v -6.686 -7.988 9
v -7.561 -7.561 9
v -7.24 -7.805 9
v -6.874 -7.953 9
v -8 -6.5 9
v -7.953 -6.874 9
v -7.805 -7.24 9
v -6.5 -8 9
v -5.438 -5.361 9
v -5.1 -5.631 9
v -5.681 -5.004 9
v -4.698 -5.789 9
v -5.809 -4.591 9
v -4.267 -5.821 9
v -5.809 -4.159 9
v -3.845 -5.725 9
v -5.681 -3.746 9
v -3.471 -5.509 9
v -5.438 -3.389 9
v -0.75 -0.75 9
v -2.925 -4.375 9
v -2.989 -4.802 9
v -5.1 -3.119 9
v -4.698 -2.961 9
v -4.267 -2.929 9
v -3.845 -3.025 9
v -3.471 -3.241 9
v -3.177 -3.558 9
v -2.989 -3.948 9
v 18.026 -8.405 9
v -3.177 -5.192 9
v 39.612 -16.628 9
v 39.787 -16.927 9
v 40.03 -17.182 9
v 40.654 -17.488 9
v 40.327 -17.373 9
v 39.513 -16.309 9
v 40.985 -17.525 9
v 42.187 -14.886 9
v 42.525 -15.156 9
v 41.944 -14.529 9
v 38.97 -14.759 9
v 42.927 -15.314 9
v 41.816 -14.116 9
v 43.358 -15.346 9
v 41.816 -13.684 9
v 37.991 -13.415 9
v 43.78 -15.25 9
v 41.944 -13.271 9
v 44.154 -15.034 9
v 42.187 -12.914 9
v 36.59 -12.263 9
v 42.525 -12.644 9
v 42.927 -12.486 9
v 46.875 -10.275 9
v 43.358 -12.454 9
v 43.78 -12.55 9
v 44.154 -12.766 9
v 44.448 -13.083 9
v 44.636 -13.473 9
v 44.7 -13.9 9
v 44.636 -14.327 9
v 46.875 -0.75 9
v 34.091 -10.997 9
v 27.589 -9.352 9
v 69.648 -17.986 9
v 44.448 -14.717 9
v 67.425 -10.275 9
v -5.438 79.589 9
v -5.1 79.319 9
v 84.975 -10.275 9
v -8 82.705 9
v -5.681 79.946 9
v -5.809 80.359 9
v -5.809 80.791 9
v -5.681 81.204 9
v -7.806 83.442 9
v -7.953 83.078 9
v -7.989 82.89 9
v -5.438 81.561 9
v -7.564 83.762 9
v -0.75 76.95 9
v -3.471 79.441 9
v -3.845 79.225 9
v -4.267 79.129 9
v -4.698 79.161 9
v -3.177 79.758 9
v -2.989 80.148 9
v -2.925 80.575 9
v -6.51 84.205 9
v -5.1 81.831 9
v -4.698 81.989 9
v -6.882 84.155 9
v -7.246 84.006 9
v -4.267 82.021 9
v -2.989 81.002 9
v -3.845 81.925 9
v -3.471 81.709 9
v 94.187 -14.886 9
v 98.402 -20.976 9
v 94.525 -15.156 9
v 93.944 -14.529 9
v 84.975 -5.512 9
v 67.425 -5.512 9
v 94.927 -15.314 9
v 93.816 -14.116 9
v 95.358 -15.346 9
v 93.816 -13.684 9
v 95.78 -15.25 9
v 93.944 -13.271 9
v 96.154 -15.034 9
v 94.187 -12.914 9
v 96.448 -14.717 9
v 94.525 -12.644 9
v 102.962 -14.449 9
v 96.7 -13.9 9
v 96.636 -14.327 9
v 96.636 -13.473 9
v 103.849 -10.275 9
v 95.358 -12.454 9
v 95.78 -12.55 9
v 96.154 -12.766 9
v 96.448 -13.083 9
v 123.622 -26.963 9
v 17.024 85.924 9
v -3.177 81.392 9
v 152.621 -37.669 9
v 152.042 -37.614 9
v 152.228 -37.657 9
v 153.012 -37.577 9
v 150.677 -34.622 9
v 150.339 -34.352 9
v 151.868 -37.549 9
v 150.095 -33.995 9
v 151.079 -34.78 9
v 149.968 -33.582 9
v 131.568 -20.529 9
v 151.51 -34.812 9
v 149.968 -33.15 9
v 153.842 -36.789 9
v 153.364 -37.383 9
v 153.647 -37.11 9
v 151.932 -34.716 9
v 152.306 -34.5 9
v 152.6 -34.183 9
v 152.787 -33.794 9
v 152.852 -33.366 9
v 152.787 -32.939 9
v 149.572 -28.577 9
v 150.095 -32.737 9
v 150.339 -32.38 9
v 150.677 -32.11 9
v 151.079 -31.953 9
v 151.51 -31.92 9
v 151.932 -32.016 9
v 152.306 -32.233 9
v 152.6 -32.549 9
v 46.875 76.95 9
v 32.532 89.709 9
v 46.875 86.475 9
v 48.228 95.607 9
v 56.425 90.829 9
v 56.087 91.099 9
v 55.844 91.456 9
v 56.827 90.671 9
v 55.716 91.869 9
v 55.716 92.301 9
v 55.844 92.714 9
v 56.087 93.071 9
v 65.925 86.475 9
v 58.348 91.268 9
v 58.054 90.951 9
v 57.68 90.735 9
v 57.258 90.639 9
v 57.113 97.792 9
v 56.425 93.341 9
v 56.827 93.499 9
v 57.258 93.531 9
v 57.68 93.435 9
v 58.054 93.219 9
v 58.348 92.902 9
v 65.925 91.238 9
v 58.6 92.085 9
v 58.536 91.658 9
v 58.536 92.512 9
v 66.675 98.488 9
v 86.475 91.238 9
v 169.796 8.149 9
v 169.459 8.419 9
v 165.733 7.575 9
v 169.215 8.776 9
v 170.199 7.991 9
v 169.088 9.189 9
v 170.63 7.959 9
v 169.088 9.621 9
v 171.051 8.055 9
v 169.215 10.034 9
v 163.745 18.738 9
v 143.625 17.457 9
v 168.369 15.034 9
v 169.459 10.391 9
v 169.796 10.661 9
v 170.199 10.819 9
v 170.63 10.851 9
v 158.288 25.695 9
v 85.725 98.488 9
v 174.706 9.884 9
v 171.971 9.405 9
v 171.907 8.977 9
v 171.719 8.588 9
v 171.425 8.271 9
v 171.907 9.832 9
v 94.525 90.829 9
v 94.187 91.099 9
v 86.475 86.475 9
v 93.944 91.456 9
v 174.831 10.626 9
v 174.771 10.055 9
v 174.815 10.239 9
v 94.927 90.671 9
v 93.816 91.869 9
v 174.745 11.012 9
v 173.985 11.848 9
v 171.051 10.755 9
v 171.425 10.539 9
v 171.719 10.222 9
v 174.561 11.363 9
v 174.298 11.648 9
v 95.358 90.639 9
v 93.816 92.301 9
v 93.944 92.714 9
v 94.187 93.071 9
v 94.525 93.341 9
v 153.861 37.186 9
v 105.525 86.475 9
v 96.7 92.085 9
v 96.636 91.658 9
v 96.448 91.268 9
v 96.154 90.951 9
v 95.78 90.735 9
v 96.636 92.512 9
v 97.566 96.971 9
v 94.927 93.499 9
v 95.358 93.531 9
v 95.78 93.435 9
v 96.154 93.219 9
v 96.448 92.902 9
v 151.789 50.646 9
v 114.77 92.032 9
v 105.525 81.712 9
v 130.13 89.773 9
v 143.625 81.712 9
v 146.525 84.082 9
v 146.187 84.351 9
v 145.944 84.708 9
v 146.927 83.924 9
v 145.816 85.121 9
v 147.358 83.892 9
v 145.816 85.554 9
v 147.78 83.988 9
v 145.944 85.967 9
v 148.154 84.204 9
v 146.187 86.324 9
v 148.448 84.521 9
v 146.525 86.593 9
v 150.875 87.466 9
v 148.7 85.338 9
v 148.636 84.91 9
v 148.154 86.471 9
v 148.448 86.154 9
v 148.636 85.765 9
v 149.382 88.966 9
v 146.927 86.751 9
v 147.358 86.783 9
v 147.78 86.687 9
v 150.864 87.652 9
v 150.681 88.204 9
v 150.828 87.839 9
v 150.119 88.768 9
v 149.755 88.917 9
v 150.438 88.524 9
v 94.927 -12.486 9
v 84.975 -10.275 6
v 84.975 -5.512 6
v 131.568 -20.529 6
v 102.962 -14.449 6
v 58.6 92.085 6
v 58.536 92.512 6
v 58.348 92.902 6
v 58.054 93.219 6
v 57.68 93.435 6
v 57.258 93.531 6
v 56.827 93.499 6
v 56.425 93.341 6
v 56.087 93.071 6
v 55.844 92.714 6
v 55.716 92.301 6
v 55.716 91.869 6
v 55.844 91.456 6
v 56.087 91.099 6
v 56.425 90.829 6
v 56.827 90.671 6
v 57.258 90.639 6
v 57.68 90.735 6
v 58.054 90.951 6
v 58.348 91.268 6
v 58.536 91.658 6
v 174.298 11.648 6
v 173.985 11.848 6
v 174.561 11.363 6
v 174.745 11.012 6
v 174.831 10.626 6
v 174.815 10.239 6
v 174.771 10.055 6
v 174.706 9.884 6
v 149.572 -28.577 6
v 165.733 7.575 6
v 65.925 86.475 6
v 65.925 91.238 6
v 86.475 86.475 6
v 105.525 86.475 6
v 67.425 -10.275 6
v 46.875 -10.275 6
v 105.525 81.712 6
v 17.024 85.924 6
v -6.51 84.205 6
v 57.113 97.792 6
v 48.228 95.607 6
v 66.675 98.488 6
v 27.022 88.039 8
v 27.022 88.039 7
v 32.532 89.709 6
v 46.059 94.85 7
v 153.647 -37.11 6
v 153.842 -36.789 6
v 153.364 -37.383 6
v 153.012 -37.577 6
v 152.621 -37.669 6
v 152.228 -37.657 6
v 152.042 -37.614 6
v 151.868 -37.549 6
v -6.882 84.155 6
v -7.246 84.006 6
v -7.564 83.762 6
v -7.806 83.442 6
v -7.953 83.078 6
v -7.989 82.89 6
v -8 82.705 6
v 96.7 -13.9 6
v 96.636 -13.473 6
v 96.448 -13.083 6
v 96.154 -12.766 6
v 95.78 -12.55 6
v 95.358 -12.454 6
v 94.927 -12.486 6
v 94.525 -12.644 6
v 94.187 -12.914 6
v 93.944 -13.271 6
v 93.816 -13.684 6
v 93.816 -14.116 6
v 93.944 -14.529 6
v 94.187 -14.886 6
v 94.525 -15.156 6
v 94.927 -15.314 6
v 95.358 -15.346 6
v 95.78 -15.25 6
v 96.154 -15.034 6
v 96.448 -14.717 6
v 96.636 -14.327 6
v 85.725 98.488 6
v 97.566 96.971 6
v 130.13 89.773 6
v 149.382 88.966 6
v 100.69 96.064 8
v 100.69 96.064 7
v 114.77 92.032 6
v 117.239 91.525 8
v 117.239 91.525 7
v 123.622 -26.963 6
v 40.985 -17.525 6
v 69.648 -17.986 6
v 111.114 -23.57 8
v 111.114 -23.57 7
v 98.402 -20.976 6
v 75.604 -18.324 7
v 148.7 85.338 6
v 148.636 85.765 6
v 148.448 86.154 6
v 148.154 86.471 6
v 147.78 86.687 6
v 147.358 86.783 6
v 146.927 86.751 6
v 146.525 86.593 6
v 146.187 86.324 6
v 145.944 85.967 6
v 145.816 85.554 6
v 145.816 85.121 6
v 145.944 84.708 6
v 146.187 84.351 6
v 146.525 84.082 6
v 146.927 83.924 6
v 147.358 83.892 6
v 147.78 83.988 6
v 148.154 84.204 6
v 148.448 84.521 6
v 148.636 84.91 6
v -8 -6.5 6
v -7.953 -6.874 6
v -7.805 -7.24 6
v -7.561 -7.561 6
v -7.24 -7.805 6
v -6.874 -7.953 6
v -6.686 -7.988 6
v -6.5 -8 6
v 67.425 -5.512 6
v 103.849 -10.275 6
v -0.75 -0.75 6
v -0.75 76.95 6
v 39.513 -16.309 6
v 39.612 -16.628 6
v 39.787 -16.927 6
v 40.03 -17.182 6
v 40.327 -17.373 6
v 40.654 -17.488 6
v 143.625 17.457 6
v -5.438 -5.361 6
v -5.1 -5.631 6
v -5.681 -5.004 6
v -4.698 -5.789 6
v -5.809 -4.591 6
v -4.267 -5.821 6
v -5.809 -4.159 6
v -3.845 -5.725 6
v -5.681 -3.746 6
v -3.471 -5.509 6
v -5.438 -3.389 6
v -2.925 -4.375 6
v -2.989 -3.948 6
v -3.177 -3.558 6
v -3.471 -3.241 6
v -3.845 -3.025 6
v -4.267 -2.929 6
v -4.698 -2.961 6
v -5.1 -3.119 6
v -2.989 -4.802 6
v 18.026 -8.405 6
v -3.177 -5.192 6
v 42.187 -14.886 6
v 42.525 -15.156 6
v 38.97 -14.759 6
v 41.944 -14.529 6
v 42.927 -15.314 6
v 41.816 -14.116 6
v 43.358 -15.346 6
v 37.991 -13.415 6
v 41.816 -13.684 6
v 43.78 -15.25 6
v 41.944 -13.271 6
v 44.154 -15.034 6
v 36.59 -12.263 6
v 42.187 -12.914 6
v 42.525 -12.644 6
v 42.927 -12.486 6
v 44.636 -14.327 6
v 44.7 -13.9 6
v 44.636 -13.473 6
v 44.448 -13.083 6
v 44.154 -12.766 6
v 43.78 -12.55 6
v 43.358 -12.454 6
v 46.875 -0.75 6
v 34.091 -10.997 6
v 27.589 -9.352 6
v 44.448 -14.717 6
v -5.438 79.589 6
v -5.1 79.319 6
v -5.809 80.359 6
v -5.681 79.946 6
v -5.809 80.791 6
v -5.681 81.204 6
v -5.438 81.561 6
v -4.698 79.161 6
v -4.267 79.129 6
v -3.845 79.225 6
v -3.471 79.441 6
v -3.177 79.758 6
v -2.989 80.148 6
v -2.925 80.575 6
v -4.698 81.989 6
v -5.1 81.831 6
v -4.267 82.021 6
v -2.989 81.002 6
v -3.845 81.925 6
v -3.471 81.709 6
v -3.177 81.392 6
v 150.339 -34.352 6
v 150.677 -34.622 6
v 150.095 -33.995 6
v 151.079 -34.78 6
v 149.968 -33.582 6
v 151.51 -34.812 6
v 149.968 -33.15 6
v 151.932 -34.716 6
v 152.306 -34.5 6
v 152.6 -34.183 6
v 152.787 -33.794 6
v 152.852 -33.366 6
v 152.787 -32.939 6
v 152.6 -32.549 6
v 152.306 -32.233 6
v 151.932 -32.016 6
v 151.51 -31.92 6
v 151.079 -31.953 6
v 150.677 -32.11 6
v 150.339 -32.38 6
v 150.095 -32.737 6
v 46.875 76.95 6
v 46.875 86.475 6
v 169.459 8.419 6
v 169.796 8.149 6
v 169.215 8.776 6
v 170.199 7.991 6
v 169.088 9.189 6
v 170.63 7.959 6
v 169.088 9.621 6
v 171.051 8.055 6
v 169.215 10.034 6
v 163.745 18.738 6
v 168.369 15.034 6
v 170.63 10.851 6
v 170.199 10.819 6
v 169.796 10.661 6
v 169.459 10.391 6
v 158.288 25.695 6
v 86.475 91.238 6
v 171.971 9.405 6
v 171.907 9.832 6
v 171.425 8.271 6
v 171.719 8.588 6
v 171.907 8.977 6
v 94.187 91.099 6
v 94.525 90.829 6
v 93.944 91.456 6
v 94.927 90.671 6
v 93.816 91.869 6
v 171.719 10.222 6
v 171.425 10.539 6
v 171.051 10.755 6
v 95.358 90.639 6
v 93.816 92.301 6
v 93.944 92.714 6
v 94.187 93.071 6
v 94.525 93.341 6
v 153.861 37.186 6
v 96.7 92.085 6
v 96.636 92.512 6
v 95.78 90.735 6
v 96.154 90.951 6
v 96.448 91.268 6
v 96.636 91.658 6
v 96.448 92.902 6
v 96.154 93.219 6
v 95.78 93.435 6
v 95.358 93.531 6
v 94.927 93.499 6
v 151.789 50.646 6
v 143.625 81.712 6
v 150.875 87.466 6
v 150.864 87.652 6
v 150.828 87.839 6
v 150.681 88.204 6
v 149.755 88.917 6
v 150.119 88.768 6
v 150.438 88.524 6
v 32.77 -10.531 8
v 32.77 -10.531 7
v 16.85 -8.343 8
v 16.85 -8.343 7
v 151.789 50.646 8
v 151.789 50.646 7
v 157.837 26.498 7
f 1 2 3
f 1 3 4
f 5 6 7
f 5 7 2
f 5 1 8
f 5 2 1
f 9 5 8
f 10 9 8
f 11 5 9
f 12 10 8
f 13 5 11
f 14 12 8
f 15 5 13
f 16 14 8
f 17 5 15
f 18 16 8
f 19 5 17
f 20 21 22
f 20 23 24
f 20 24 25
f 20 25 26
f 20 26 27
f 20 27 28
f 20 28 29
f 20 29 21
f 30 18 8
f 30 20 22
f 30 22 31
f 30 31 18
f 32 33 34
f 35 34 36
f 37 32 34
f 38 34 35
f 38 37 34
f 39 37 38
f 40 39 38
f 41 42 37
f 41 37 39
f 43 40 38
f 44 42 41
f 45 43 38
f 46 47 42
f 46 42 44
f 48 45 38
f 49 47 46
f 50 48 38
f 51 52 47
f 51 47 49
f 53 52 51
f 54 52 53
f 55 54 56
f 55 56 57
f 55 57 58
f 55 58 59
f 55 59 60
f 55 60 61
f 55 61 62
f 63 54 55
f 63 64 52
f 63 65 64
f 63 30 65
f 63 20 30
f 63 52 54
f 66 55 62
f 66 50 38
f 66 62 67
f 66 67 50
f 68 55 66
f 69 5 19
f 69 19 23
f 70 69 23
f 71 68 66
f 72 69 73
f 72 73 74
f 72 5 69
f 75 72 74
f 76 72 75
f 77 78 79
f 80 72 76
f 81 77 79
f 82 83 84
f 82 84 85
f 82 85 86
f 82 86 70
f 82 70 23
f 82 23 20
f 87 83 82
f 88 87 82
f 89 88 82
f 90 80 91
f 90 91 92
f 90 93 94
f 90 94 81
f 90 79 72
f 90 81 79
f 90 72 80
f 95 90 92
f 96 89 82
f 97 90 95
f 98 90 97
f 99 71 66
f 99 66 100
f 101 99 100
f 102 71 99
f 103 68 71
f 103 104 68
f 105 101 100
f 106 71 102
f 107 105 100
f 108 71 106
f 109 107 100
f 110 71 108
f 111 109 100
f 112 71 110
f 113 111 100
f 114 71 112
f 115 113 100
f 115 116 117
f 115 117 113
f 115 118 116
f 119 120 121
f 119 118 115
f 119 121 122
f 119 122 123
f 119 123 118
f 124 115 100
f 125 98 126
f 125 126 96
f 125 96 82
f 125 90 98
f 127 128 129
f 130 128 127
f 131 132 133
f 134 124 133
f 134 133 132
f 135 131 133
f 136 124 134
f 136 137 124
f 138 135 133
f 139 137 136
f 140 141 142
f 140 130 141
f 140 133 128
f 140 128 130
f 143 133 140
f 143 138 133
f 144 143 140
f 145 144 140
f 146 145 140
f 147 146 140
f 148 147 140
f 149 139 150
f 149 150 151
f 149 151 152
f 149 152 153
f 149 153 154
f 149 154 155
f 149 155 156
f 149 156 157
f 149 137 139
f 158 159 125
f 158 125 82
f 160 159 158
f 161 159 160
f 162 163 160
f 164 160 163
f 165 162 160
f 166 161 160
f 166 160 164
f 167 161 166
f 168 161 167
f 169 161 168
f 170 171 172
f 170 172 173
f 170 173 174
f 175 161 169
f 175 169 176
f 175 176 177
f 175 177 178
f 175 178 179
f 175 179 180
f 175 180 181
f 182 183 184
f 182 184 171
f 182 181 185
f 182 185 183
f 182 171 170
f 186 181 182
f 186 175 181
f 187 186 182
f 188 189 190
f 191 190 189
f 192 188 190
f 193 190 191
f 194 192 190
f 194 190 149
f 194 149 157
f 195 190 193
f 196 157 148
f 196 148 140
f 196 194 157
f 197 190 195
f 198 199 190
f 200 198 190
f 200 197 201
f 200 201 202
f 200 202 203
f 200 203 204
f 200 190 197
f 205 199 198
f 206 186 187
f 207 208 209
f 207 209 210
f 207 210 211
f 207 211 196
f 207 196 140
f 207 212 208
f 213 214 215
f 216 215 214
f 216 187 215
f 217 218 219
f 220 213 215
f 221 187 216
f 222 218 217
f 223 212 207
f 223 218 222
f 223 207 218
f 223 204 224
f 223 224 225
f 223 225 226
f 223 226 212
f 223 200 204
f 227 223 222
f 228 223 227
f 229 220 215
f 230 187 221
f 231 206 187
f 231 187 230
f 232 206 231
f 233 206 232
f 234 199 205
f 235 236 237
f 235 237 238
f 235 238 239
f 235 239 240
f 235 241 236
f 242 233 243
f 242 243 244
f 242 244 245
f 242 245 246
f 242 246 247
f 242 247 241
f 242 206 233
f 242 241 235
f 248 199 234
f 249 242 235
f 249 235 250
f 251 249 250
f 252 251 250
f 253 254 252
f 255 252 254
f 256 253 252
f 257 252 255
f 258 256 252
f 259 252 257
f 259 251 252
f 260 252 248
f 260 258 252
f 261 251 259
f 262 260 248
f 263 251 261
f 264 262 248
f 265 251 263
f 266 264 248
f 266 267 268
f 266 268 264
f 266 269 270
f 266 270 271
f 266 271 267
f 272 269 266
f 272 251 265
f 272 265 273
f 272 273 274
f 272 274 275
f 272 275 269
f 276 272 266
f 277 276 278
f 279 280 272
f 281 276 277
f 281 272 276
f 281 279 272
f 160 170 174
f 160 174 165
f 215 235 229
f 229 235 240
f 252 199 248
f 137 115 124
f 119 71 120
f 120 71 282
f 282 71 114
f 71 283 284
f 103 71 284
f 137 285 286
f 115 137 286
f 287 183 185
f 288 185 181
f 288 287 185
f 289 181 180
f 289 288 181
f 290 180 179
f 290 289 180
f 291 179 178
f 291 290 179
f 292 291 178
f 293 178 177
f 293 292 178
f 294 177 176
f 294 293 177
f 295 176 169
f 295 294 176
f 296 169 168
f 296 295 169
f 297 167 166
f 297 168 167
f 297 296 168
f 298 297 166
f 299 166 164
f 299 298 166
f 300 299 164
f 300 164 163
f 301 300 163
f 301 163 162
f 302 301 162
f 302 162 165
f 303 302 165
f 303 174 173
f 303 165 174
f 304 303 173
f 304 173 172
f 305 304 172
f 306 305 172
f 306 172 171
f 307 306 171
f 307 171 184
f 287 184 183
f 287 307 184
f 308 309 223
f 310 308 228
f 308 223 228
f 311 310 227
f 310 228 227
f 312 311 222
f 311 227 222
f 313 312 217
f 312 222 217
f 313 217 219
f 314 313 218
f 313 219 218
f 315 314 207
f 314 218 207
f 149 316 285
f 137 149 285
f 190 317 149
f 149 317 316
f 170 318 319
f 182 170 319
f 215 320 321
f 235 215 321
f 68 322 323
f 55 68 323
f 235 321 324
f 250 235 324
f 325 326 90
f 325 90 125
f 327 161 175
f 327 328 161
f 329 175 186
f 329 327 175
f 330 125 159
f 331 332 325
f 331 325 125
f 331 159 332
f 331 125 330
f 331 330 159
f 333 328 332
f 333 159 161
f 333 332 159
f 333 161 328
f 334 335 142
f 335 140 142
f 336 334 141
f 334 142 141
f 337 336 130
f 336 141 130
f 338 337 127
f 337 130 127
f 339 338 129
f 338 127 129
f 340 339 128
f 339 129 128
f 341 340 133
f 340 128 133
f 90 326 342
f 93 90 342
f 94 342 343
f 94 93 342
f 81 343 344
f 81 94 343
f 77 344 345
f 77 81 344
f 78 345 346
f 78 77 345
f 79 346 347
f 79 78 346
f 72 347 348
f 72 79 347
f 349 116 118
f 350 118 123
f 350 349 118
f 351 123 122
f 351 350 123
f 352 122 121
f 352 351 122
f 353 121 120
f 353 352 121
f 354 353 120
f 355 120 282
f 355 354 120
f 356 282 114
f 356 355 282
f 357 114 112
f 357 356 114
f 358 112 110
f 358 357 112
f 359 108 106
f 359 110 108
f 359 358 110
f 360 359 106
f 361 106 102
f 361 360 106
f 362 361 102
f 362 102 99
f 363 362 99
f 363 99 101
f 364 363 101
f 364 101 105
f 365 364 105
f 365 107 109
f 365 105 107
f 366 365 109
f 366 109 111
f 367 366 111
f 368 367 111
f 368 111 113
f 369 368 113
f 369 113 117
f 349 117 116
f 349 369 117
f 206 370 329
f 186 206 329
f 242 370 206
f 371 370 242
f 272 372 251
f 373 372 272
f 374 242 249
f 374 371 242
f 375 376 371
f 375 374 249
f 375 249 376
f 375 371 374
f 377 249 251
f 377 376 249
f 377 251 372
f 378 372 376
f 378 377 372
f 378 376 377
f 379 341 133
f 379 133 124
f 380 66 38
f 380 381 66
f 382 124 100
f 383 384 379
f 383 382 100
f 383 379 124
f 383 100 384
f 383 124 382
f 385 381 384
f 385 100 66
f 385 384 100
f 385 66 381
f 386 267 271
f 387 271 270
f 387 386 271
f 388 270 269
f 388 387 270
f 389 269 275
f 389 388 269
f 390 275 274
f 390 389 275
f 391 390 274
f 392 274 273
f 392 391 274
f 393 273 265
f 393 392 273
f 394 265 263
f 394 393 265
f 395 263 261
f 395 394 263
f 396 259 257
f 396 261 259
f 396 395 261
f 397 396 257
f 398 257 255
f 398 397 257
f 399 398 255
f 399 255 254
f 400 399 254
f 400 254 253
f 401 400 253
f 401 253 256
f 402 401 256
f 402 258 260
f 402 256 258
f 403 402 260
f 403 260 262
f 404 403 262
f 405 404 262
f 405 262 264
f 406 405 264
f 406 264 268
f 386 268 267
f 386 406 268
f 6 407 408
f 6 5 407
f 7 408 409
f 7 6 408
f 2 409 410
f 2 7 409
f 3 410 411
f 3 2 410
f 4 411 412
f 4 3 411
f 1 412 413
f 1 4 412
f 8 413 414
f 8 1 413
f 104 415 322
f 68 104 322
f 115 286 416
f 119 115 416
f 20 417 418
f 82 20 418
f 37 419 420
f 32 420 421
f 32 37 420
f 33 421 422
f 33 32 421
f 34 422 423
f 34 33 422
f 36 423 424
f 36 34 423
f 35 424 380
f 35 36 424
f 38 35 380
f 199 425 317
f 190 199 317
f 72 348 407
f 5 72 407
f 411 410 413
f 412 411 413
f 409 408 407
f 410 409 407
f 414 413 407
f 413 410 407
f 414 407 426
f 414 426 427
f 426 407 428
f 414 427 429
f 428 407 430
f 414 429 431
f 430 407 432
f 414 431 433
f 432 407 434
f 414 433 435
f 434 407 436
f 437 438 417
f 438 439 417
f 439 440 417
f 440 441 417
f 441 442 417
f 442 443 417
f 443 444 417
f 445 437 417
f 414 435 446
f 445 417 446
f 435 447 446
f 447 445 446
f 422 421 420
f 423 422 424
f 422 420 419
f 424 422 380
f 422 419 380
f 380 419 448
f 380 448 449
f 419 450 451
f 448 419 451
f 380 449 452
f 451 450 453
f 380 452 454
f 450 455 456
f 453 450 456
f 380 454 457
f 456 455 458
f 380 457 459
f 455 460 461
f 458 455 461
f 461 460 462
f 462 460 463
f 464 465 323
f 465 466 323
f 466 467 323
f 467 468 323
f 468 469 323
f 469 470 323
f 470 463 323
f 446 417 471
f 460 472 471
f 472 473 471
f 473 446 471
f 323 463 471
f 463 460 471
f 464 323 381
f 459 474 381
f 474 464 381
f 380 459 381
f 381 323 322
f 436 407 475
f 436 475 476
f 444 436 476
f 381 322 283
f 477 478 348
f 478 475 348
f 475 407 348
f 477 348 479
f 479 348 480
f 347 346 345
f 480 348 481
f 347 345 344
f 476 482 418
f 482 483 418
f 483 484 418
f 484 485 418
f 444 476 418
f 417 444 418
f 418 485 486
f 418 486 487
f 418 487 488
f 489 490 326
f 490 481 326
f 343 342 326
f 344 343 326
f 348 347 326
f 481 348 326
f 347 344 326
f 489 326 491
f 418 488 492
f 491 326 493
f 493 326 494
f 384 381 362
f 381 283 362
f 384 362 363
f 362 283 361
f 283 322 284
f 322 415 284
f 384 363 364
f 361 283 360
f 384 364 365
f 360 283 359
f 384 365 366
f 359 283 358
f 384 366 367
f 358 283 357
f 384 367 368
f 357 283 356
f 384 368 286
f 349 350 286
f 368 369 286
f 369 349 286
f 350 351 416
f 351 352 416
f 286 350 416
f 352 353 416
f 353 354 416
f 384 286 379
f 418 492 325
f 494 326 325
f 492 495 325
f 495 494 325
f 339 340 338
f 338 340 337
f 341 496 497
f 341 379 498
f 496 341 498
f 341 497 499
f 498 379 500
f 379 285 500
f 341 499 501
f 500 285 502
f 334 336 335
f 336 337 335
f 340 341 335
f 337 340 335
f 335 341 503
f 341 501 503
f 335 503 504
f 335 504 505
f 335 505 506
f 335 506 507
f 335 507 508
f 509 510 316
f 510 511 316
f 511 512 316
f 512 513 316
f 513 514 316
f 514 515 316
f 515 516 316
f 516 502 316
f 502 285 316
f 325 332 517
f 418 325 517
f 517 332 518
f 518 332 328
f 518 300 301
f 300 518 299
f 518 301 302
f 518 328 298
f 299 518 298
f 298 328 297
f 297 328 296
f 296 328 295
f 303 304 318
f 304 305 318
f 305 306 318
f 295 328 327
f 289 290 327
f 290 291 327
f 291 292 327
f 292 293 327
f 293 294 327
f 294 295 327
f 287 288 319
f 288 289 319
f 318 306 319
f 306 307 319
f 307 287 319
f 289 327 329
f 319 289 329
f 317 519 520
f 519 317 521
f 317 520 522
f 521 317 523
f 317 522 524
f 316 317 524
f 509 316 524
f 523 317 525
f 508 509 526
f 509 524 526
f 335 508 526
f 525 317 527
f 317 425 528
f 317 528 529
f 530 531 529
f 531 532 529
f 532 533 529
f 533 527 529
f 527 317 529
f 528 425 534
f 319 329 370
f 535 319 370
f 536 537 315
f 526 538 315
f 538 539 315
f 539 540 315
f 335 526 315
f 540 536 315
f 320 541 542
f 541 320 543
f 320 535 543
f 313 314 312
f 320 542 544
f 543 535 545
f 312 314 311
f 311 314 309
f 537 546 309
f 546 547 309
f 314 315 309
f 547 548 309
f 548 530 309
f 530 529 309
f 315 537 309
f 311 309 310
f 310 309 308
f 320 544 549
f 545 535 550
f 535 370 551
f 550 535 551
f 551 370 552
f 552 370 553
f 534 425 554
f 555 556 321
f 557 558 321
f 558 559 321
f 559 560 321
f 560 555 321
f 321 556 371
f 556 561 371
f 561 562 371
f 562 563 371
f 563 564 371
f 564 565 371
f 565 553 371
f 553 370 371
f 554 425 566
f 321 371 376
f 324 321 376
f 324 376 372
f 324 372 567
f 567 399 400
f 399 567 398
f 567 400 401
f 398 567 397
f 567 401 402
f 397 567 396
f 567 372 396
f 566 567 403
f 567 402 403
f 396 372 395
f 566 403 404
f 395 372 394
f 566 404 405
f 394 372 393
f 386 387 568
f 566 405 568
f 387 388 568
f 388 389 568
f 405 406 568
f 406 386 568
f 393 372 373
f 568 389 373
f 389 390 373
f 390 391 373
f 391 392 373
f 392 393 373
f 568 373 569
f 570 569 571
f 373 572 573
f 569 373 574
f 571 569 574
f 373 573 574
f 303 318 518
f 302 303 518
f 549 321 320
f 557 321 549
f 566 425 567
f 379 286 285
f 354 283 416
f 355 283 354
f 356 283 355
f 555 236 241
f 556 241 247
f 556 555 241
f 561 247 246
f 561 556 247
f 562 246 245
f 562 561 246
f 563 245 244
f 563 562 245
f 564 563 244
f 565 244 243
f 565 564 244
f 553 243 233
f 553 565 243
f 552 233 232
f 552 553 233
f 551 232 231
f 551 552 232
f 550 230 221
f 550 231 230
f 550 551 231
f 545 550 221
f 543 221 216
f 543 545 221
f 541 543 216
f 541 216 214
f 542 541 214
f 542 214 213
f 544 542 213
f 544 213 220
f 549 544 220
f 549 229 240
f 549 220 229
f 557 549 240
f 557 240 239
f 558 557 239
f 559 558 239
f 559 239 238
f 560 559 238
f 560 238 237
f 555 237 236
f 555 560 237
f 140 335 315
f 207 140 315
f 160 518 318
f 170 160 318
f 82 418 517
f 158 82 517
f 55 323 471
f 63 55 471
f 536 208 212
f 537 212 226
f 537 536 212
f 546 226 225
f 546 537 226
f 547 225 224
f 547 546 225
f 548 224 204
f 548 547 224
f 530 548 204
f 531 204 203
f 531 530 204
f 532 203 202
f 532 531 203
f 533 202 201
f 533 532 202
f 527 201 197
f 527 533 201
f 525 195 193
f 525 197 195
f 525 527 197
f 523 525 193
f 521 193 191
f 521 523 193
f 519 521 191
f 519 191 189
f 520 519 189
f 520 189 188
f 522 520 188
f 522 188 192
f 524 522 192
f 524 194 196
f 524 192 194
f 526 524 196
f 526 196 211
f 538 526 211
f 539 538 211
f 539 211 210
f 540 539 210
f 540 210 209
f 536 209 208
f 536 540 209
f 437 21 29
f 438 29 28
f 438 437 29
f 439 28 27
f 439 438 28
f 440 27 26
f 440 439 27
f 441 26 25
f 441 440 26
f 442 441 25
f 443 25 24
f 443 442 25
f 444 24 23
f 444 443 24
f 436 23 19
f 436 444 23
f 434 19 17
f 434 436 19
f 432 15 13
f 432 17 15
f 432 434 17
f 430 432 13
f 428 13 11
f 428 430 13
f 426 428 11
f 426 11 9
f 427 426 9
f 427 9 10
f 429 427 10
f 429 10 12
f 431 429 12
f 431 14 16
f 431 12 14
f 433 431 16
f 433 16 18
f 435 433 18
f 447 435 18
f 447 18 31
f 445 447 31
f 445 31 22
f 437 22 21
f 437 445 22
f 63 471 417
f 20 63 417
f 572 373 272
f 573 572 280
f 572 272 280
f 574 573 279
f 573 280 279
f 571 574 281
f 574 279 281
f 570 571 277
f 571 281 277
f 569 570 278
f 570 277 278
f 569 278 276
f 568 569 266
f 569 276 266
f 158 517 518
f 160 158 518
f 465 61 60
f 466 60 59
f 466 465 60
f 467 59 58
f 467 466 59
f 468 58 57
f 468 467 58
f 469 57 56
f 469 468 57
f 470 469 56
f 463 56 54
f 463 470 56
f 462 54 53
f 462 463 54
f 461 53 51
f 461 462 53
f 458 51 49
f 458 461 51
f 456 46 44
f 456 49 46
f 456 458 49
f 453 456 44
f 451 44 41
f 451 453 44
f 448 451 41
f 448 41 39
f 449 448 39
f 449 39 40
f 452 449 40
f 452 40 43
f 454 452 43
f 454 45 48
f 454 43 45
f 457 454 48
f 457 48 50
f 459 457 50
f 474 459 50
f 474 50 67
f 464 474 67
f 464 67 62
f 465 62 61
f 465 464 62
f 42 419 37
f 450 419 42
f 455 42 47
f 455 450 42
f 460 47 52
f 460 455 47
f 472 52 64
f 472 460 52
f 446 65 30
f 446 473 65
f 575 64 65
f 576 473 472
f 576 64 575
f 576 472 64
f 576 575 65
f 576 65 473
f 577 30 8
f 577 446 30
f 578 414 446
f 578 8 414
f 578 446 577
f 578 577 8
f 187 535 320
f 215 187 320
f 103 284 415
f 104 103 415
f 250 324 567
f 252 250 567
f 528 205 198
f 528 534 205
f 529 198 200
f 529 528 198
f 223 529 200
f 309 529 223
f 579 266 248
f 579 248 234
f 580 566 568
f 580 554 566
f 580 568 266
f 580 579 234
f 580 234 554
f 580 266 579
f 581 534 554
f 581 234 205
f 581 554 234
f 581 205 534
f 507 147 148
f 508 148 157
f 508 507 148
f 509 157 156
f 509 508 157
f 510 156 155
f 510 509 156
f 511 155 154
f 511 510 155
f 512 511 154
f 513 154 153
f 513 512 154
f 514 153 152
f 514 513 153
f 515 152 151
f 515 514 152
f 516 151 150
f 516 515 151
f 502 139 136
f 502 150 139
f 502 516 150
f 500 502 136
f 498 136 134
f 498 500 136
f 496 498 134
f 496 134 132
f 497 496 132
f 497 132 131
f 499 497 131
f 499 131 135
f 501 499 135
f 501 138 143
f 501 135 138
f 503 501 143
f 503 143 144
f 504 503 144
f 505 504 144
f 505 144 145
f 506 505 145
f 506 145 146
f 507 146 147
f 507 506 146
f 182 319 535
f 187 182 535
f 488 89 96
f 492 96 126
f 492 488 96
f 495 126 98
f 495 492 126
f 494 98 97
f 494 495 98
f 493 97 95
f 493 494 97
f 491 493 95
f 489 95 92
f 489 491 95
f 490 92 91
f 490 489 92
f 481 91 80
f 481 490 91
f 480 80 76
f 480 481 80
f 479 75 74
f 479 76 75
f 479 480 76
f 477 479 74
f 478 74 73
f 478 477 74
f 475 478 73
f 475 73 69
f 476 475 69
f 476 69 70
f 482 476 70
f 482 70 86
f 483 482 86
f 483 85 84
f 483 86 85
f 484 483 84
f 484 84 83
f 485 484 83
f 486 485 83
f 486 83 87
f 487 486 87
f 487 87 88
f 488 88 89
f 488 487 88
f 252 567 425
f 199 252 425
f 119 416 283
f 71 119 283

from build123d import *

# Parameters (mm, degrees)
PAD004_DEPTH    = 3
POCKET007_DEPTH = 5
SKETCH037_R     = 1.45
POCKET021_DEPTH = 9
FILLET002_R     = 1.5


with BuildPart() as part:
    # Sketch021 → Pad004 (new body)
    with BuildSketch(Plane.XY):
        with BuildLine():
            Line((85.725, 98.4875), (66.675, 98.4875))
            add(Edge.make_bspline(
                [(-8, 84.2), (39.625, 84.2), (39.625, 98.4875), (66.675, 98.4875)],
                knots=[0, 0, 0, 0, 1, 1, 1, 1], degree=3))
            Line((-8, 84.2), (-8, -8))
            add(Edge.make_bspline(
                [(39.625, -17.525), (39.625, -8), (20.575, -8), (-8, -8)],
                knots=[0, 0, 0, 0, 1, 1, 1, 1], degree=3))
            add(Edge.make_bspline(
                [(153.231854, -38.154949), (107.082107, -17.525), (76.2, -17.525), (39.625, -17.525)],
                knots=[0, 0, 0, 0, 1, 1, 1, 1], degree=3))
            Line((153.231854, -38.154949), (175.310198, 11.234895))
            add(Edge.make_bspline(
                [(150.875, 88.9625), (150.875, 42.8625), (150.875, 22.157965), (175.310198, 11.234895)],
                knots=[0, 0, 0, 0, 1, 1, 1, 1], degree=3))
            add(Edge.make_bspline(
                [(85.725, 98.4875), (104.775, 98.4875), (104.775, 88.9625), (150.875, 88.9625)],
                knots=[0, 0, 0, 0, 1, 1, 1, 1], degree=3))
        make_face()
    extrude(amount=PAD004_DEPTH)

    # Sketch023 → Pocket007 (cut)
    with BuildSketch(Plane(origin=(0, 0, 0), x_dir=(1, 0, 0), z_dir=(0, 0, -1))):
        Polygon((-0.75, 0.75), (-0.75, -76.95), (46.875, -76.95), (46.875, -86.475), (65.925, -86.475), (65.925, -91.2375), (86.475, -91.2375), (86.475, -86.475), (105.525, -86.475), (105.525, -81.7125), (143.625, -81.7125), (143.625, -17.457464), (165.732668, -7.574851), (149.57181, 28.577419), (131.568158, 20.529392), (102.96164, 14.448889), (103.848827, 10.275), (84.975, 10.275), (84.975, 5.5125), (67.425, 5.5125), (67.425, 10.275), (46.875, 10.275), (46.875, 0.75), align=None)
    extrude(amount=-POCKET007_DEPTH, mode=Mode.SUBTRACT)

    # Sketch037 → Pocket021 (cut)
    with BuildSketch(Plane.XY):
        with Locations((-4.375, -4.375)):
            Circle(SKETCH037_R)
        with Locations((-4.375, 80.575)):
            Circle(SKETCH037_R)
        with Locations((151.401832, -33.366184)):
            Circle(SKETCH037_R)
        with Locations((170.521433, 9.404873)):
            Circle(SKETCH037_R)
        with Locations((147.25, 85.3375)):
            Circle(SKETCH037_R)
        with Locations((43.25, -13.9)):
            Circle(SKETCH037_R)
        with Locations((57.15, 92.085)):
            Circle(SKETCH037_R)
        with Locations((95.25, 92.085)):
            Circle(SKETCH037_R)
        with Locations((95.25, -13.9)):
            Circle(SKETCH037_R)
    extrude(amount=POCKET021_DEPTH, mode=Mode.SUBTRACT)

    # Fillet002
    fillet002_edges = [part.edges().sort_by_distance(p)[0] for p in [
        (-8, -8, 1.5),
        (-8, 84.2, 1.5),
        (150.875, 88.9625, 1.5),
        (175.310198, 11.234895, 1.5),
        (153.231854, -38.154949, 1.5),
        (39.625, -17.525, 1.5),
    ]]
    fillet(fillet002_edges, radius=FILLET002_R)


with BuildPart() as part_1:
    # Body003 placement: moved
    add(part.part.moved(Location((0, 0, 6))))


solid = part_1.part
